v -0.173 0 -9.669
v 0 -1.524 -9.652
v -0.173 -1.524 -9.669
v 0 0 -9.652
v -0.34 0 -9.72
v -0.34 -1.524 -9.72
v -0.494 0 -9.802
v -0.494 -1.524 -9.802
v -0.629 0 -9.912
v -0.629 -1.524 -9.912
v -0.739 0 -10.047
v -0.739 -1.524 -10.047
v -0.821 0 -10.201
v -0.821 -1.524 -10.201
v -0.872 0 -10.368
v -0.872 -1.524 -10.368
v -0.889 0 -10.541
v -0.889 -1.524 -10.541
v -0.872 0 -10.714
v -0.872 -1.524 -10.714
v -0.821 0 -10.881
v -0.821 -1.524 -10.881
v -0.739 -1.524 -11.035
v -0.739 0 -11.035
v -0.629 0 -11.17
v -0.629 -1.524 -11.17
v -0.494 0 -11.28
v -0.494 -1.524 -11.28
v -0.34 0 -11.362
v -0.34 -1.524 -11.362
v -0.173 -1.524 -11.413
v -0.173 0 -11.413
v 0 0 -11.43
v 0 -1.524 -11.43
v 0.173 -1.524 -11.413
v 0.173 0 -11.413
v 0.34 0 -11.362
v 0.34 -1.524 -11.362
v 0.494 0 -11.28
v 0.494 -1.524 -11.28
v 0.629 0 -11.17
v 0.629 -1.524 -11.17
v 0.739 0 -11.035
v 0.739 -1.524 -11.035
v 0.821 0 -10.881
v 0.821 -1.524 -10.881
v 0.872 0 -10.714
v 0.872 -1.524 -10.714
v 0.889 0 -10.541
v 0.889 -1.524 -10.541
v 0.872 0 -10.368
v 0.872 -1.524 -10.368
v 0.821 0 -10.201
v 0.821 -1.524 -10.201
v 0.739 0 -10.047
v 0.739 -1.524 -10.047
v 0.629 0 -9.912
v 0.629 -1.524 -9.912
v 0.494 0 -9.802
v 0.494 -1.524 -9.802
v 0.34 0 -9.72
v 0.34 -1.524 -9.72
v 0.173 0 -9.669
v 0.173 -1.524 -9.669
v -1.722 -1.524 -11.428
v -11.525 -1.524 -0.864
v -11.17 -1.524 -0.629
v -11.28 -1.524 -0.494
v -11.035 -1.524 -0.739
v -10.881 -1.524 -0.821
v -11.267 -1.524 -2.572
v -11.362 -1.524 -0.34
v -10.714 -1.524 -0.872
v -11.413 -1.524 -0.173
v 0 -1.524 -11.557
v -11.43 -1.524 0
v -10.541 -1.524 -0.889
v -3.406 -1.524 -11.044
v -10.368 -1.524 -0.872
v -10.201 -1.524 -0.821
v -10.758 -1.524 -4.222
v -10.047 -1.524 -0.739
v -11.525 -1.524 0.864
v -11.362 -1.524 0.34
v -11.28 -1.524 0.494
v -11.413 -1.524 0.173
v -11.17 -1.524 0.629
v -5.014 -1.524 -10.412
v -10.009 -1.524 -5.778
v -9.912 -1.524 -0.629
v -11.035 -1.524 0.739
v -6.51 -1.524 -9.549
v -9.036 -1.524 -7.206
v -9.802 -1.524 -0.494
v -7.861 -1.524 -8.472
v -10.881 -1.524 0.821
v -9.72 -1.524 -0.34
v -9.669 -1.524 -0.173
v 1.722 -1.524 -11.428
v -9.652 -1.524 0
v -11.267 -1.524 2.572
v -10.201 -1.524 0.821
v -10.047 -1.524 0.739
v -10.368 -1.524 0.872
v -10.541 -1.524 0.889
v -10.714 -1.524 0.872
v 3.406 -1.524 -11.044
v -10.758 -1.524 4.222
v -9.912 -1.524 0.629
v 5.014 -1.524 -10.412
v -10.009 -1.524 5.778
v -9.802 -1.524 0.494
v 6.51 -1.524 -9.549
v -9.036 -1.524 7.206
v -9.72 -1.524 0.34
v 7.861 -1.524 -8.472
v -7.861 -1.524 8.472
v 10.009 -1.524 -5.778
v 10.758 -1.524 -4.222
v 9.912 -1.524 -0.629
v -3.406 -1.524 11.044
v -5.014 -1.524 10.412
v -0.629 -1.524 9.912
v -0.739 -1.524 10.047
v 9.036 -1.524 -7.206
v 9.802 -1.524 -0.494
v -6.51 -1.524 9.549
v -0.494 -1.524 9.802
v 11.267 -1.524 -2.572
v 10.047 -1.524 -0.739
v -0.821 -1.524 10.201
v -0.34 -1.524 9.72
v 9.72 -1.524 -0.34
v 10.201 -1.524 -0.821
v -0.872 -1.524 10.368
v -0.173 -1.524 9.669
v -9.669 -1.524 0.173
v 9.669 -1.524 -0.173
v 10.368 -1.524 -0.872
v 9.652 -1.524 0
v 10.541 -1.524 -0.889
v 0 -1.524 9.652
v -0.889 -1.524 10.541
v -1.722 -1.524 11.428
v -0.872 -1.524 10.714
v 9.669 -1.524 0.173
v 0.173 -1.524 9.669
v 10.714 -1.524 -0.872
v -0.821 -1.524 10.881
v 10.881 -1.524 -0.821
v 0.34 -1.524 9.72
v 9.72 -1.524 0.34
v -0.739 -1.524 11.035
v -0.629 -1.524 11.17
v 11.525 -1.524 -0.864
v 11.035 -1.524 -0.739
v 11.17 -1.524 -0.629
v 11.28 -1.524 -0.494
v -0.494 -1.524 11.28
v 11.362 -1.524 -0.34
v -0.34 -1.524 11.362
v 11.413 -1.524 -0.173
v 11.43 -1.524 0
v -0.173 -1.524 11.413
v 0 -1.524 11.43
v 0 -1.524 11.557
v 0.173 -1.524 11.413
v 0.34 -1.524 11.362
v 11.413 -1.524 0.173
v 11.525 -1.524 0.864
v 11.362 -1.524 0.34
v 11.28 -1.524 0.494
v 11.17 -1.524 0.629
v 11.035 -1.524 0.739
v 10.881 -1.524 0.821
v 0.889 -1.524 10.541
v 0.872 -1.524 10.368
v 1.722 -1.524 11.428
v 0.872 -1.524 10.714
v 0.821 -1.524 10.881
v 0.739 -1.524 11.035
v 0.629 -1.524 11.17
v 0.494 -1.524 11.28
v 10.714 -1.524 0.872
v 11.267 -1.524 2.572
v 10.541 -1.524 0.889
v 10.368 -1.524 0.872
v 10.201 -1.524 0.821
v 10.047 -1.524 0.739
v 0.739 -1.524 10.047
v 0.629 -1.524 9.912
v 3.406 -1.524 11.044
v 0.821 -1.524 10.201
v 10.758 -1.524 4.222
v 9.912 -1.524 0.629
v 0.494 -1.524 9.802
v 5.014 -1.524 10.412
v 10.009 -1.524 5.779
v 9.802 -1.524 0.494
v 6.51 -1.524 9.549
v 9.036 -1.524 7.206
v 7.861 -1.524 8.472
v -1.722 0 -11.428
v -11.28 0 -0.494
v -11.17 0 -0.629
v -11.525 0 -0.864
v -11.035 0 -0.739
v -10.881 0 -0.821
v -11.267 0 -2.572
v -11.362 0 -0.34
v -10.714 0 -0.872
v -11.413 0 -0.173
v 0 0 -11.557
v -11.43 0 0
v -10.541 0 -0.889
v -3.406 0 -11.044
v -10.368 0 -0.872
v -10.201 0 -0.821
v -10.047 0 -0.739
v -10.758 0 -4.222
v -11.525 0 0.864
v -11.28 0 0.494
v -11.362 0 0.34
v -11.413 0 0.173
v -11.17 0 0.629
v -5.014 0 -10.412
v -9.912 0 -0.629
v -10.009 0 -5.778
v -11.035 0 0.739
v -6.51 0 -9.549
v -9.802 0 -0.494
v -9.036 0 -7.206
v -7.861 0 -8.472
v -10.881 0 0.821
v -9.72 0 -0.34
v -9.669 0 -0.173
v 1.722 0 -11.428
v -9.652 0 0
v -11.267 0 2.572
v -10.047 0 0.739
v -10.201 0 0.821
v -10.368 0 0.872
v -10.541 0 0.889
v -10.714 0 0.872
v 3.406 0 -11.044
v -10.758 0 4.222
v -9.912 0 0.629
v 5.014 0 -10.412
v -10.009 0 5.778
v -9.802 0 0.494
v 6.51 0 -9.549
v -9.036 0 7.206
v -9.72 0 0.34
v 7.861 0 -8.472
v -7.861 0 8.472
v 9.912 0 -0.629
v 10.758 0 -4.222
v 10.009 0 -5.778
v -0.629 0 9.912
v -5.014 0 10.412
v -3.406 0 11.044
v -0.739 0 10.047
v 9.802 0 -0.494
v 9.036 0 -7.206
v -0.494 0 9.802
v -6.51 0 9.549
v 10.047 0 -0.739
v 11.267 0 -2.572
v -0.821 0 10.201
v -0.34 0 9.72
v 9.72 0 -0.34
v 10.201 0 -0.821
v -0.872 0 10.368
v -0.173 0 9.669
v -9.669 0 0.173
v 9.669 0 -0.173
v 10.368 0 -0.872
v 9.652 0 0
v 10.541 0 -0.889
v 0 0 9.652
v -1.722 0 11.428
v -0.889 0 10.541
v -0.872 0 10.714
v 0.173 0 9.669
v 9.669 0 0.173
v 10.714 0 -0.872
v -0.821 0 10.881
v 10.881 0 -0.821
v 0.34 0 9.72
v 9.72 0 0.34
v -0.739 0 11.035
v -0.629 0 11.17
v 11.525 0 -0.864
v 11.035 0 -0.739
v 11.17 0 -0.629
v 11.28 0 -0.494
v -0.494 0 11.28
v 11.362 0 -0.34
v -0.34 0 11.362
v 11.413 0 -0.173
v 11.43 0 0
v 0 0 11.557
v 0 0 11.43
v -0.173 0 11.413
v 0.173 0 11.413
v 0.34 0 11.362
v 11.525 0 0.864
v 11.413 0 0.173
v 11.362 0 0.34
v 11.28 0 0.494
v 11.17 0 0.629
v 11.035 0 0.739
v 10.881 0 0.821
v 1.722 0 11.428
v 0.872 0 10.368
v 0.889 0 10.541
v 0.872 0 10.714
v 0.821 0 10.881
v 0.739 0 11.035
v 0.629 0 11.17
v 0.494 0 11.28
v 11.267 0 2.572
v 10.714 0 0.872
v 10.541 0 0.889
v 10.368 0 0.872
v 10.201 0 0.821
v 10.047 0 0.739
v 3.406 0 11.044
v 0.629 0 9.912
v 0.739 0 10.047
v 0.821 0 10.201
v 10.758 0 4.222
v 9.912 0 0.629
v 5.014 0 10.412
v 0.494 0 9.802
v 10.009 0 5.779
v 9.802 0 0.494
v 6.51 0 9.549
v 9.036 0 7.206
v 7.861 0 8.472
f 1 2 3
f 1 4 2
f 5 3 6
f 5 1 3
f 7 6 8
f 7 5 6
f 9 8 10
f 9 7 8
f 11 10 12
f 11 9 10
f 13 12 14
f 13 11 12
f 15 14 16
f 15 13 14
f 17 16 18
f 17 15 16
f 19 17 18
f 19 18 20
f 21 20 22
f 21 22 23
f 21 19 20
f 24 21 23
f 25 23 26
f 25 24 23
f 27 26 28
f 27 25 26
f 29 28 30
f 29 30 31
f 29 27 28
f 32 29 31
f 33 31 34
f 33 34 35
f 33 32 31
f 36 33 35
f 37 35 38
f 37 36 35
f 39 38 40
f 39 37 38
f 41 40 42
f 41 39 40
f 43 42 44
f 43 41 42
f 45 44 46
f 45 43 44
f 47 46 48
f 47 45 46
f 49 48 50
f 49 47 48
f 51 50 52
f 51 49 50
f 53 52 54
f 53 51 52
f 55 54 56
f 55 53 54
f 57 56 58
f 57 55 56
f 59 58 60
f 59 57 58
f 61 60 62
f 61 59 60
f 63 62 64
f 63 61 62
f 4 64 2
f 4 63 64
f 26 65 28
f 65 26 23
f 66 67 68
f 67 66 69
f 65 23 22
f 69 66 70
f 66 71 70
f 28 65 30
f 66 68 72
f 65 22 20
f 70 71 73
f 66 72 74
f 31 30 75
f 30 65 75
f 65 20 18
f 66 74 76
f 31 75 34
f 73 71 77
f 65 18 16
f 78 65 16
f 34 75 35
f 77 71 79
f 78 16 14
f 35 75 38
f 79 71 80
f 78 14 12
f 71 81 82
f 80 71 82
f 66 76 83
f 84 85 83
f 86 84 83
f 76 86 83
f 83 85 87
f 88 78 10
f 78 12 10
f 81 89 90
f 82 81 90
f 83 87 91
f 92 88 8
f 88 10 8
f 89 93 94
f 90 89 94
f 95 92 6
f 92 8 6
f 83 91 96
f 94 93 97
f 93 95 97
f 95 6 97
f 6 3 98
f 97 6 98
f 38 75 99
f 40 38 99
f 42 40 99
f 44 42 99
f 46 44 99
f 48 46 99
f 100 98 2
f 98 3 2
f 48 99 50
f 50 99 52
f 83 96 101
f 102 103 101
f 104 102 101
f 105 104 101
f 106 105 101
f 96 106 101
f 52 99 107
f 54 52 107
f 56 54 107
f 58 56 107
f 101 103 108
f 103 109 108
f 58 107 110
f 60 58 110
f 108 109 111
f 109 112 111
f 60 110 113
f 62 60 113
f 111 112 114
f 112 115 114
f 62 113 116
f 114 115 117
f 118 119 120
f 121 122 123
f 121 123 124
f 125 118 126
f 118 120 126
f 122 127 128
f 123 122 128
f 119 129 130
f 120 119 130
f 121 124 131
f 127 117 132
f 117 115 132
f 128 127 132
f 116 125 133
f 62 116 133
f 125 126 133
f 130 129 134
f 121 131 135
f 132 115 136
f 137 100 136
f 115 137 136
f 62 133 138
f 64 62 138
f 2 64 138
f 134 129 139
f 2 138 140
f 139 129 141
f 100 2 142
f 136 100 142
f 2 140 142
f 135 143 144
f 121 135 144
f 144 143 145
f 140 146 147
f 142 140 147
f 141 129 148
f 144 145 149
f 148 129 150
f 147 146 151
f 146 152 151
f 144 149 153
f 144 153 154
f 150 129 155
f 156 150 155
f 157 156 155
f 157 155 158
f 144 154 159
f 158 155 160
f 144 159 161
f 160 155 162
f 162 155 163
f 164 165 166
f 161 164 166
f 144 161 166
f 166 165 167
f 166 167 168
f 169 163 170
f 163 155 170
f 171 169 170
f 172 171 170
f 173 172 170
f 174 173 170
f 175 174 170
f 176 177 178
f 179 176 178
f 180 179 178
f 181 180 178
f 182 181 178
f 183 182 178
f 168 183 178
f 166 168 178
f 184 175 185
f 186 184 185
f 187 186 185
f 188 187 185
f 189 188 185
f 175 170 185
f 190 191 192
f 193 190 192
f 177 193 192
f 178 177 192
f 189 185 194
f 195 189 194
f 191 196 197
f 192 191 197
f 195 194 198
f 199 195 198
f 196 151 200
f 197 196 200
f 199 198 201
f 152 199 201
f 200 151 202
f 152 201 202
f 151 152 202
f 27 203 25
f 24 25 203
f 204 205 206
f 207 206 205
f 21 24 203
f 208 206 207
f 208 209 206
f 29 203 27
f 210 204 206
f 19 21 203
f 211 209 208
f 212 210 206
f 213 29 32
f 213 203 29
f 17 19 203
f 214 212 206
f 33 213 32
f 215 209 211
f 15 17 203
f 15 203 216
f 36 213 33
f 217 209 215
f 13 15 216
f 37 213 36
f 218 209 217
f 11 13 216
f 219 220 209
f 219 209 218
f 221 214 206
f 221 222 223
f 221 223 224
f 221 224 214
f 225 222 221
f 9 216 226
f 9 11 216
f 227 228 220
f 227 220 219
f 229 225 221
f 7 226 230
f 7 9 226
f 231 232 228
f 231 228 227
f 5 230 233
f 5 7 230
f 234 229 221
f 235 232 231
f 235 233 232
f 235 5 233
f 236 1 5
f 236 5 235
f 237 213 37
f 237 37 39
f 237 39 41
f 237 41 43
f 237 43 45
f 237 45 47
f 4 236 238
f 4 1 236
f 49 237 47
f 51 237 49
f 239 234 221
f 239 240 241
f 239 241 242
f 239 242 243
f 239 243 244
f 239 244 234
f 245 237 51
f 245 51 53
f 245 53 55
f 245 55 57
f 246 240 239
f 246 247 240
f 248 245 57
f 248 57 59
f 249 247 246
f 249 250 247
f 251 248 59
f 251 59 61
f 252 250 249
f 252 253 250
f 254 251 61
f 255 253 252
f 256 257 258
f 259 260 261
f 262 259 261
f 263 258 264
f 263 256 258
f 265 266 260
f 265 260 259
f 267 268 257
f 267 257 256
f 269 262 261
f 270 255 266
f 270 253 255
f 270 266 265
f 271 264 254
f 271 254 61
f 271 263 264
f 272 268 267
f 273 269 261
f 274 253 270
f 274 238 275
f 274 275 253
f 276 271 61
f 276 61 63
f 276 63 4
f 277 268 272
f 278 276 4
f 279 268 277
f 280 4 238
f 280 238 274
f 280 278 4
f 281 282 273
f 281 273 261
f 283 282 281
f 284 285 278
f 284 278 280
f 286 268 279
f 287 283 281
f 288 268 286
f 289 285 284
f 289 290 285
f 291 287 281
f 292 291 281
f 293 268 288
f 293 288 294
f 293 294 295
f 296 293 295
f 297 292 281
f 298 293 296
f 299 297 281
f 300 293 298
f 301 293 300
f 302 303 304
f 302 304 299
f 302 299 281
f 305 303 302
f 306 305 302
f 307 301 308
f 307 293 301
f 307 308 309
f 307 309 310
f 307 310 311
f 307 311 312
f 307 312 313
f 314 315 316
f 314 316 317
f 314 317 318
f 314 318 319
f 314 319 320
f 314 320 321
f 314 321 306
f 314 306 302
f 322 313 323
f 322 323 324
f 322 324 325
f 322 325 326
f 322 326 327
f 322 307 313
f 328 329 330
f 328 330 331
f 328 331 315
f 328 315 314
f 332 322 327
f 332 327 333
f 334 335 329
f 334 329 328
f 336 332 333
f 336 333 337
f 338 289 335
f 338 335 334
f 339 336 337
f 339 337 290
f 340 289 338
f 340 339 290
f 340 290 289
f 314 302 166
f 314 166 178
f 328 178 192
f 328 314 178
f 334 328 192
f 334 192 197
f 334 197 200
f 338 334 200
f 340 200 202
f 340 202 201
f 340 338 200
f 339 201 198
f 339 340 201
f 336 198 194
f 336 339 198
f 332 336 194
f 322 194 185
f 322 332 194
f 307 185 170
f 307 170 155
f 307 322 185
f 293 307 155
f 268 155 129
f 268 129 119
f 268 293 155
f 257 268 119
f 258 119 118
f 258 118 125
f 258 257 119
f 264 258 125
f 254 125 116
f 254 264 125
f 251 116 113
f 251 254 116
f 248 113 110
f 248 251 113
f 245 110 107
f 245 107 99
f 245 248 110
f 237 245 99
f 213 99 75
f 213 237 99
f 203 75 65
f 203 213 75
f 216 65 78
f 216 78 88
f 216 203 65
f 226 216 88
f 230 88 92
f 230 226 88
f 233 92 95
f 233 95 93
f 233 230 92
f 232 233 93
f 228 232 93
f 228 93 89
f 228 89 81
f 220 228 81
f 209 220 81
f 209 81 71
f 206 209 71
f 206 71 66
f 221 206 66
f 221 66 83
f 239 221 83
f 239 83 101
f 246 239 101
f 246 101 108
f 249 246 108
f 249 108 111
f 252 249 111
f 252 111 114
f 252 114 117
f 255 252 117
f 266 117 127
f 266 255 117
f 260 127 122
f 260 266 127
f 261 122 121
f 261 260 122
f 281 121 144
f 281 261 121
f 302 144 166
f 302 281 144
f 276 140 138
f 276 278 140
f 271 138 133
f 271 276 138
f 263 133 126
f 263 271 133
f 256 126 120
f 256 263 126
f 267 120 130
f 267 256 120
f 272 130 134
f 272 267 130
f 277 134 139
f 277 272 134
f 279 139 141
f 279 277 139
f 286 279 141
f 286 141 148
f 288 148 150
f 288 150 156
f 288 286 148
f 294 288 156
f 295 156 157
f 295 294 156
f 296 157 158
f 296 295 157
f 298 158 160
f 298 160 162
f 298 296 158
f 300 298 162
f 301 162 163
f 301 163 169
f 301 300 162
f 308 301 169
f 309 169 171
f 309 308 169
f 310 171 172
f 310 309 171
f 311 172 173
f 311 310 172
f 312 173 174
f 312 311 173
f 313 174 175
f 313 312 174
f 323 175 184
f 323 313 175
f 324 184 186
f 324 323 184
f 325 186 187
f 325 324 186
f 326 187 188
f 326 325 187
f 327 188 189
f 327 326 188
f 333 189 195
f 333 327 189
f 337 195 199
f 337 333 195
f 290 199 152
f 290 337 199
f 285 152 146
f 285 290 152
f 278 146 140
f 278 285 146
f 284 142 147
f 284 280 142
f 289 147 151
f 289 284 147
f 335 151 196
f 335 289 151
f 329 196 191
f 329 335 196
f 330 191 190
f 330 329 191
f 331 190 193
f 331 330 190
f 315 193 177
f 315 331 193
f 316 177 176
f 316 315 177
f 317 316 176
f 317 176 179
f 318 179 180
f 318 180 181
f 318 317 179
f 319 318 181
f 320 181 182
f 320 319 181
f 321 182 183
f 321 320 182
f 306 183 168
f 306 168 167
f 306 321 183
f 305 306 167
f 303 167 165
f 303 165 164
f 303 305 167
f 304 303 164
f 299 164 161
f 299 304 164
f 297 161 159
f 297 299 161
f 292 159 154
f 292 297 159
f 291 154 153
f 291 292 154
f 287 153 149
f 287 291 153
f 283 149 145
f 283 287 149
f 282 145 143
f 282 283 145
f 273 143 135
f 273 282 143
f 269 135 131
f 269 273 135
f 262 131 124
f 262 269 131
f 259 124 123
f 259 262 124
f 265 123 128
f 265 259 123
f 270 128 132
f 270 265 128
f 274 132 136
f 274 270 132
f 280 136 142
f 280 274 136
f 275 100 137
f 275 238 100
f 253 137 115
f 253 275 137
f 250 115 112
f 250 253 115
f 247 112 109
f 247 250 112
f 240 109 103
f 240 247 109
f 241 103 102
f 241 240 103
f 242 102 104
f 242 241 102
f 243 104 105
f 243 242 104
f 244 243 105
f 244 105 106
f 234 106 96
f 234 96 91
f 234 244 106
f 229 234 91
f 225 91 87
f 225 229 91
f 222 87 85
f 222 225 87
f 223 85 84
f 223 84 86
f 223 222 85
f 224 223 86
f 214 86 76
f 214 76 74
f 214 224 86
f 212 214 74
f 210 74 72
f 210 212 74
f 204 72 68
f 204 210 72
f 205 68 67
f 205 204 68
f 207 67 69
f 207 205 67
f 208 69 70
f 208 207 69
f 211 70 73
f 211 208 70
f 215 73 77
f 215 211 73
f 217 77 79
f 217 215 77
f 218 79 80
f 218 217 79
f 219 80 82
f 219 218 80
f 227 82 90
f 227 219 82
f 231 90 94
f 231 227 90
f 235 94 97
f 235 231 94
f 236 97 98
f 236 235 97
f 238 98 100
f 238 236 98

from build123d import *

# Parameters (mm, degrees)
OUTTER_R          = 11.557
BODY_DEPTH        = 1.524
SCREW_HOLES_COUNT = 4


with BuildPart() as part:
    # outter → Body (new body)
    with BuildSketch(Plane(origin=(0, 0, 0), x_dir=(1, 0, 0), z_dir=(0, 1, 0))):
        Circle(OUTTER_R)
    extrude(amount=-BODY_DEPTH)

    # Sketch12 → #0 Clearance Hole (revolve, cut)
    with BuildSketch(Plane(origin=(0, 0, -10.541), x_dir=(0, 0, 1), z_dir=(1, 0, 0))):
        Polygon((0, 0), (0, 2.05816509), (0.889, 1.524), (0.889, 0), align=None)
    f_0_clearance_hole = revolve(axis=Axis((0, 6.35, -10.541), (0, -1, 0)), mode=Mode.SUBTRACT)

    # Screw Holes: #0 Clearance Hole ×4 about axis
    screw_holes_axis = Axis((0, 0.0762, 0), (0, -1, 0))
    for i in range(1, SCREW_HOLES_COUNT):
        add(f_0_clearance_hole.rotate(screw_holes_axis, i * 360 / SCREW_HOLES_COUNT), mode=Mode.SUBTRACT)


solid = part.part
